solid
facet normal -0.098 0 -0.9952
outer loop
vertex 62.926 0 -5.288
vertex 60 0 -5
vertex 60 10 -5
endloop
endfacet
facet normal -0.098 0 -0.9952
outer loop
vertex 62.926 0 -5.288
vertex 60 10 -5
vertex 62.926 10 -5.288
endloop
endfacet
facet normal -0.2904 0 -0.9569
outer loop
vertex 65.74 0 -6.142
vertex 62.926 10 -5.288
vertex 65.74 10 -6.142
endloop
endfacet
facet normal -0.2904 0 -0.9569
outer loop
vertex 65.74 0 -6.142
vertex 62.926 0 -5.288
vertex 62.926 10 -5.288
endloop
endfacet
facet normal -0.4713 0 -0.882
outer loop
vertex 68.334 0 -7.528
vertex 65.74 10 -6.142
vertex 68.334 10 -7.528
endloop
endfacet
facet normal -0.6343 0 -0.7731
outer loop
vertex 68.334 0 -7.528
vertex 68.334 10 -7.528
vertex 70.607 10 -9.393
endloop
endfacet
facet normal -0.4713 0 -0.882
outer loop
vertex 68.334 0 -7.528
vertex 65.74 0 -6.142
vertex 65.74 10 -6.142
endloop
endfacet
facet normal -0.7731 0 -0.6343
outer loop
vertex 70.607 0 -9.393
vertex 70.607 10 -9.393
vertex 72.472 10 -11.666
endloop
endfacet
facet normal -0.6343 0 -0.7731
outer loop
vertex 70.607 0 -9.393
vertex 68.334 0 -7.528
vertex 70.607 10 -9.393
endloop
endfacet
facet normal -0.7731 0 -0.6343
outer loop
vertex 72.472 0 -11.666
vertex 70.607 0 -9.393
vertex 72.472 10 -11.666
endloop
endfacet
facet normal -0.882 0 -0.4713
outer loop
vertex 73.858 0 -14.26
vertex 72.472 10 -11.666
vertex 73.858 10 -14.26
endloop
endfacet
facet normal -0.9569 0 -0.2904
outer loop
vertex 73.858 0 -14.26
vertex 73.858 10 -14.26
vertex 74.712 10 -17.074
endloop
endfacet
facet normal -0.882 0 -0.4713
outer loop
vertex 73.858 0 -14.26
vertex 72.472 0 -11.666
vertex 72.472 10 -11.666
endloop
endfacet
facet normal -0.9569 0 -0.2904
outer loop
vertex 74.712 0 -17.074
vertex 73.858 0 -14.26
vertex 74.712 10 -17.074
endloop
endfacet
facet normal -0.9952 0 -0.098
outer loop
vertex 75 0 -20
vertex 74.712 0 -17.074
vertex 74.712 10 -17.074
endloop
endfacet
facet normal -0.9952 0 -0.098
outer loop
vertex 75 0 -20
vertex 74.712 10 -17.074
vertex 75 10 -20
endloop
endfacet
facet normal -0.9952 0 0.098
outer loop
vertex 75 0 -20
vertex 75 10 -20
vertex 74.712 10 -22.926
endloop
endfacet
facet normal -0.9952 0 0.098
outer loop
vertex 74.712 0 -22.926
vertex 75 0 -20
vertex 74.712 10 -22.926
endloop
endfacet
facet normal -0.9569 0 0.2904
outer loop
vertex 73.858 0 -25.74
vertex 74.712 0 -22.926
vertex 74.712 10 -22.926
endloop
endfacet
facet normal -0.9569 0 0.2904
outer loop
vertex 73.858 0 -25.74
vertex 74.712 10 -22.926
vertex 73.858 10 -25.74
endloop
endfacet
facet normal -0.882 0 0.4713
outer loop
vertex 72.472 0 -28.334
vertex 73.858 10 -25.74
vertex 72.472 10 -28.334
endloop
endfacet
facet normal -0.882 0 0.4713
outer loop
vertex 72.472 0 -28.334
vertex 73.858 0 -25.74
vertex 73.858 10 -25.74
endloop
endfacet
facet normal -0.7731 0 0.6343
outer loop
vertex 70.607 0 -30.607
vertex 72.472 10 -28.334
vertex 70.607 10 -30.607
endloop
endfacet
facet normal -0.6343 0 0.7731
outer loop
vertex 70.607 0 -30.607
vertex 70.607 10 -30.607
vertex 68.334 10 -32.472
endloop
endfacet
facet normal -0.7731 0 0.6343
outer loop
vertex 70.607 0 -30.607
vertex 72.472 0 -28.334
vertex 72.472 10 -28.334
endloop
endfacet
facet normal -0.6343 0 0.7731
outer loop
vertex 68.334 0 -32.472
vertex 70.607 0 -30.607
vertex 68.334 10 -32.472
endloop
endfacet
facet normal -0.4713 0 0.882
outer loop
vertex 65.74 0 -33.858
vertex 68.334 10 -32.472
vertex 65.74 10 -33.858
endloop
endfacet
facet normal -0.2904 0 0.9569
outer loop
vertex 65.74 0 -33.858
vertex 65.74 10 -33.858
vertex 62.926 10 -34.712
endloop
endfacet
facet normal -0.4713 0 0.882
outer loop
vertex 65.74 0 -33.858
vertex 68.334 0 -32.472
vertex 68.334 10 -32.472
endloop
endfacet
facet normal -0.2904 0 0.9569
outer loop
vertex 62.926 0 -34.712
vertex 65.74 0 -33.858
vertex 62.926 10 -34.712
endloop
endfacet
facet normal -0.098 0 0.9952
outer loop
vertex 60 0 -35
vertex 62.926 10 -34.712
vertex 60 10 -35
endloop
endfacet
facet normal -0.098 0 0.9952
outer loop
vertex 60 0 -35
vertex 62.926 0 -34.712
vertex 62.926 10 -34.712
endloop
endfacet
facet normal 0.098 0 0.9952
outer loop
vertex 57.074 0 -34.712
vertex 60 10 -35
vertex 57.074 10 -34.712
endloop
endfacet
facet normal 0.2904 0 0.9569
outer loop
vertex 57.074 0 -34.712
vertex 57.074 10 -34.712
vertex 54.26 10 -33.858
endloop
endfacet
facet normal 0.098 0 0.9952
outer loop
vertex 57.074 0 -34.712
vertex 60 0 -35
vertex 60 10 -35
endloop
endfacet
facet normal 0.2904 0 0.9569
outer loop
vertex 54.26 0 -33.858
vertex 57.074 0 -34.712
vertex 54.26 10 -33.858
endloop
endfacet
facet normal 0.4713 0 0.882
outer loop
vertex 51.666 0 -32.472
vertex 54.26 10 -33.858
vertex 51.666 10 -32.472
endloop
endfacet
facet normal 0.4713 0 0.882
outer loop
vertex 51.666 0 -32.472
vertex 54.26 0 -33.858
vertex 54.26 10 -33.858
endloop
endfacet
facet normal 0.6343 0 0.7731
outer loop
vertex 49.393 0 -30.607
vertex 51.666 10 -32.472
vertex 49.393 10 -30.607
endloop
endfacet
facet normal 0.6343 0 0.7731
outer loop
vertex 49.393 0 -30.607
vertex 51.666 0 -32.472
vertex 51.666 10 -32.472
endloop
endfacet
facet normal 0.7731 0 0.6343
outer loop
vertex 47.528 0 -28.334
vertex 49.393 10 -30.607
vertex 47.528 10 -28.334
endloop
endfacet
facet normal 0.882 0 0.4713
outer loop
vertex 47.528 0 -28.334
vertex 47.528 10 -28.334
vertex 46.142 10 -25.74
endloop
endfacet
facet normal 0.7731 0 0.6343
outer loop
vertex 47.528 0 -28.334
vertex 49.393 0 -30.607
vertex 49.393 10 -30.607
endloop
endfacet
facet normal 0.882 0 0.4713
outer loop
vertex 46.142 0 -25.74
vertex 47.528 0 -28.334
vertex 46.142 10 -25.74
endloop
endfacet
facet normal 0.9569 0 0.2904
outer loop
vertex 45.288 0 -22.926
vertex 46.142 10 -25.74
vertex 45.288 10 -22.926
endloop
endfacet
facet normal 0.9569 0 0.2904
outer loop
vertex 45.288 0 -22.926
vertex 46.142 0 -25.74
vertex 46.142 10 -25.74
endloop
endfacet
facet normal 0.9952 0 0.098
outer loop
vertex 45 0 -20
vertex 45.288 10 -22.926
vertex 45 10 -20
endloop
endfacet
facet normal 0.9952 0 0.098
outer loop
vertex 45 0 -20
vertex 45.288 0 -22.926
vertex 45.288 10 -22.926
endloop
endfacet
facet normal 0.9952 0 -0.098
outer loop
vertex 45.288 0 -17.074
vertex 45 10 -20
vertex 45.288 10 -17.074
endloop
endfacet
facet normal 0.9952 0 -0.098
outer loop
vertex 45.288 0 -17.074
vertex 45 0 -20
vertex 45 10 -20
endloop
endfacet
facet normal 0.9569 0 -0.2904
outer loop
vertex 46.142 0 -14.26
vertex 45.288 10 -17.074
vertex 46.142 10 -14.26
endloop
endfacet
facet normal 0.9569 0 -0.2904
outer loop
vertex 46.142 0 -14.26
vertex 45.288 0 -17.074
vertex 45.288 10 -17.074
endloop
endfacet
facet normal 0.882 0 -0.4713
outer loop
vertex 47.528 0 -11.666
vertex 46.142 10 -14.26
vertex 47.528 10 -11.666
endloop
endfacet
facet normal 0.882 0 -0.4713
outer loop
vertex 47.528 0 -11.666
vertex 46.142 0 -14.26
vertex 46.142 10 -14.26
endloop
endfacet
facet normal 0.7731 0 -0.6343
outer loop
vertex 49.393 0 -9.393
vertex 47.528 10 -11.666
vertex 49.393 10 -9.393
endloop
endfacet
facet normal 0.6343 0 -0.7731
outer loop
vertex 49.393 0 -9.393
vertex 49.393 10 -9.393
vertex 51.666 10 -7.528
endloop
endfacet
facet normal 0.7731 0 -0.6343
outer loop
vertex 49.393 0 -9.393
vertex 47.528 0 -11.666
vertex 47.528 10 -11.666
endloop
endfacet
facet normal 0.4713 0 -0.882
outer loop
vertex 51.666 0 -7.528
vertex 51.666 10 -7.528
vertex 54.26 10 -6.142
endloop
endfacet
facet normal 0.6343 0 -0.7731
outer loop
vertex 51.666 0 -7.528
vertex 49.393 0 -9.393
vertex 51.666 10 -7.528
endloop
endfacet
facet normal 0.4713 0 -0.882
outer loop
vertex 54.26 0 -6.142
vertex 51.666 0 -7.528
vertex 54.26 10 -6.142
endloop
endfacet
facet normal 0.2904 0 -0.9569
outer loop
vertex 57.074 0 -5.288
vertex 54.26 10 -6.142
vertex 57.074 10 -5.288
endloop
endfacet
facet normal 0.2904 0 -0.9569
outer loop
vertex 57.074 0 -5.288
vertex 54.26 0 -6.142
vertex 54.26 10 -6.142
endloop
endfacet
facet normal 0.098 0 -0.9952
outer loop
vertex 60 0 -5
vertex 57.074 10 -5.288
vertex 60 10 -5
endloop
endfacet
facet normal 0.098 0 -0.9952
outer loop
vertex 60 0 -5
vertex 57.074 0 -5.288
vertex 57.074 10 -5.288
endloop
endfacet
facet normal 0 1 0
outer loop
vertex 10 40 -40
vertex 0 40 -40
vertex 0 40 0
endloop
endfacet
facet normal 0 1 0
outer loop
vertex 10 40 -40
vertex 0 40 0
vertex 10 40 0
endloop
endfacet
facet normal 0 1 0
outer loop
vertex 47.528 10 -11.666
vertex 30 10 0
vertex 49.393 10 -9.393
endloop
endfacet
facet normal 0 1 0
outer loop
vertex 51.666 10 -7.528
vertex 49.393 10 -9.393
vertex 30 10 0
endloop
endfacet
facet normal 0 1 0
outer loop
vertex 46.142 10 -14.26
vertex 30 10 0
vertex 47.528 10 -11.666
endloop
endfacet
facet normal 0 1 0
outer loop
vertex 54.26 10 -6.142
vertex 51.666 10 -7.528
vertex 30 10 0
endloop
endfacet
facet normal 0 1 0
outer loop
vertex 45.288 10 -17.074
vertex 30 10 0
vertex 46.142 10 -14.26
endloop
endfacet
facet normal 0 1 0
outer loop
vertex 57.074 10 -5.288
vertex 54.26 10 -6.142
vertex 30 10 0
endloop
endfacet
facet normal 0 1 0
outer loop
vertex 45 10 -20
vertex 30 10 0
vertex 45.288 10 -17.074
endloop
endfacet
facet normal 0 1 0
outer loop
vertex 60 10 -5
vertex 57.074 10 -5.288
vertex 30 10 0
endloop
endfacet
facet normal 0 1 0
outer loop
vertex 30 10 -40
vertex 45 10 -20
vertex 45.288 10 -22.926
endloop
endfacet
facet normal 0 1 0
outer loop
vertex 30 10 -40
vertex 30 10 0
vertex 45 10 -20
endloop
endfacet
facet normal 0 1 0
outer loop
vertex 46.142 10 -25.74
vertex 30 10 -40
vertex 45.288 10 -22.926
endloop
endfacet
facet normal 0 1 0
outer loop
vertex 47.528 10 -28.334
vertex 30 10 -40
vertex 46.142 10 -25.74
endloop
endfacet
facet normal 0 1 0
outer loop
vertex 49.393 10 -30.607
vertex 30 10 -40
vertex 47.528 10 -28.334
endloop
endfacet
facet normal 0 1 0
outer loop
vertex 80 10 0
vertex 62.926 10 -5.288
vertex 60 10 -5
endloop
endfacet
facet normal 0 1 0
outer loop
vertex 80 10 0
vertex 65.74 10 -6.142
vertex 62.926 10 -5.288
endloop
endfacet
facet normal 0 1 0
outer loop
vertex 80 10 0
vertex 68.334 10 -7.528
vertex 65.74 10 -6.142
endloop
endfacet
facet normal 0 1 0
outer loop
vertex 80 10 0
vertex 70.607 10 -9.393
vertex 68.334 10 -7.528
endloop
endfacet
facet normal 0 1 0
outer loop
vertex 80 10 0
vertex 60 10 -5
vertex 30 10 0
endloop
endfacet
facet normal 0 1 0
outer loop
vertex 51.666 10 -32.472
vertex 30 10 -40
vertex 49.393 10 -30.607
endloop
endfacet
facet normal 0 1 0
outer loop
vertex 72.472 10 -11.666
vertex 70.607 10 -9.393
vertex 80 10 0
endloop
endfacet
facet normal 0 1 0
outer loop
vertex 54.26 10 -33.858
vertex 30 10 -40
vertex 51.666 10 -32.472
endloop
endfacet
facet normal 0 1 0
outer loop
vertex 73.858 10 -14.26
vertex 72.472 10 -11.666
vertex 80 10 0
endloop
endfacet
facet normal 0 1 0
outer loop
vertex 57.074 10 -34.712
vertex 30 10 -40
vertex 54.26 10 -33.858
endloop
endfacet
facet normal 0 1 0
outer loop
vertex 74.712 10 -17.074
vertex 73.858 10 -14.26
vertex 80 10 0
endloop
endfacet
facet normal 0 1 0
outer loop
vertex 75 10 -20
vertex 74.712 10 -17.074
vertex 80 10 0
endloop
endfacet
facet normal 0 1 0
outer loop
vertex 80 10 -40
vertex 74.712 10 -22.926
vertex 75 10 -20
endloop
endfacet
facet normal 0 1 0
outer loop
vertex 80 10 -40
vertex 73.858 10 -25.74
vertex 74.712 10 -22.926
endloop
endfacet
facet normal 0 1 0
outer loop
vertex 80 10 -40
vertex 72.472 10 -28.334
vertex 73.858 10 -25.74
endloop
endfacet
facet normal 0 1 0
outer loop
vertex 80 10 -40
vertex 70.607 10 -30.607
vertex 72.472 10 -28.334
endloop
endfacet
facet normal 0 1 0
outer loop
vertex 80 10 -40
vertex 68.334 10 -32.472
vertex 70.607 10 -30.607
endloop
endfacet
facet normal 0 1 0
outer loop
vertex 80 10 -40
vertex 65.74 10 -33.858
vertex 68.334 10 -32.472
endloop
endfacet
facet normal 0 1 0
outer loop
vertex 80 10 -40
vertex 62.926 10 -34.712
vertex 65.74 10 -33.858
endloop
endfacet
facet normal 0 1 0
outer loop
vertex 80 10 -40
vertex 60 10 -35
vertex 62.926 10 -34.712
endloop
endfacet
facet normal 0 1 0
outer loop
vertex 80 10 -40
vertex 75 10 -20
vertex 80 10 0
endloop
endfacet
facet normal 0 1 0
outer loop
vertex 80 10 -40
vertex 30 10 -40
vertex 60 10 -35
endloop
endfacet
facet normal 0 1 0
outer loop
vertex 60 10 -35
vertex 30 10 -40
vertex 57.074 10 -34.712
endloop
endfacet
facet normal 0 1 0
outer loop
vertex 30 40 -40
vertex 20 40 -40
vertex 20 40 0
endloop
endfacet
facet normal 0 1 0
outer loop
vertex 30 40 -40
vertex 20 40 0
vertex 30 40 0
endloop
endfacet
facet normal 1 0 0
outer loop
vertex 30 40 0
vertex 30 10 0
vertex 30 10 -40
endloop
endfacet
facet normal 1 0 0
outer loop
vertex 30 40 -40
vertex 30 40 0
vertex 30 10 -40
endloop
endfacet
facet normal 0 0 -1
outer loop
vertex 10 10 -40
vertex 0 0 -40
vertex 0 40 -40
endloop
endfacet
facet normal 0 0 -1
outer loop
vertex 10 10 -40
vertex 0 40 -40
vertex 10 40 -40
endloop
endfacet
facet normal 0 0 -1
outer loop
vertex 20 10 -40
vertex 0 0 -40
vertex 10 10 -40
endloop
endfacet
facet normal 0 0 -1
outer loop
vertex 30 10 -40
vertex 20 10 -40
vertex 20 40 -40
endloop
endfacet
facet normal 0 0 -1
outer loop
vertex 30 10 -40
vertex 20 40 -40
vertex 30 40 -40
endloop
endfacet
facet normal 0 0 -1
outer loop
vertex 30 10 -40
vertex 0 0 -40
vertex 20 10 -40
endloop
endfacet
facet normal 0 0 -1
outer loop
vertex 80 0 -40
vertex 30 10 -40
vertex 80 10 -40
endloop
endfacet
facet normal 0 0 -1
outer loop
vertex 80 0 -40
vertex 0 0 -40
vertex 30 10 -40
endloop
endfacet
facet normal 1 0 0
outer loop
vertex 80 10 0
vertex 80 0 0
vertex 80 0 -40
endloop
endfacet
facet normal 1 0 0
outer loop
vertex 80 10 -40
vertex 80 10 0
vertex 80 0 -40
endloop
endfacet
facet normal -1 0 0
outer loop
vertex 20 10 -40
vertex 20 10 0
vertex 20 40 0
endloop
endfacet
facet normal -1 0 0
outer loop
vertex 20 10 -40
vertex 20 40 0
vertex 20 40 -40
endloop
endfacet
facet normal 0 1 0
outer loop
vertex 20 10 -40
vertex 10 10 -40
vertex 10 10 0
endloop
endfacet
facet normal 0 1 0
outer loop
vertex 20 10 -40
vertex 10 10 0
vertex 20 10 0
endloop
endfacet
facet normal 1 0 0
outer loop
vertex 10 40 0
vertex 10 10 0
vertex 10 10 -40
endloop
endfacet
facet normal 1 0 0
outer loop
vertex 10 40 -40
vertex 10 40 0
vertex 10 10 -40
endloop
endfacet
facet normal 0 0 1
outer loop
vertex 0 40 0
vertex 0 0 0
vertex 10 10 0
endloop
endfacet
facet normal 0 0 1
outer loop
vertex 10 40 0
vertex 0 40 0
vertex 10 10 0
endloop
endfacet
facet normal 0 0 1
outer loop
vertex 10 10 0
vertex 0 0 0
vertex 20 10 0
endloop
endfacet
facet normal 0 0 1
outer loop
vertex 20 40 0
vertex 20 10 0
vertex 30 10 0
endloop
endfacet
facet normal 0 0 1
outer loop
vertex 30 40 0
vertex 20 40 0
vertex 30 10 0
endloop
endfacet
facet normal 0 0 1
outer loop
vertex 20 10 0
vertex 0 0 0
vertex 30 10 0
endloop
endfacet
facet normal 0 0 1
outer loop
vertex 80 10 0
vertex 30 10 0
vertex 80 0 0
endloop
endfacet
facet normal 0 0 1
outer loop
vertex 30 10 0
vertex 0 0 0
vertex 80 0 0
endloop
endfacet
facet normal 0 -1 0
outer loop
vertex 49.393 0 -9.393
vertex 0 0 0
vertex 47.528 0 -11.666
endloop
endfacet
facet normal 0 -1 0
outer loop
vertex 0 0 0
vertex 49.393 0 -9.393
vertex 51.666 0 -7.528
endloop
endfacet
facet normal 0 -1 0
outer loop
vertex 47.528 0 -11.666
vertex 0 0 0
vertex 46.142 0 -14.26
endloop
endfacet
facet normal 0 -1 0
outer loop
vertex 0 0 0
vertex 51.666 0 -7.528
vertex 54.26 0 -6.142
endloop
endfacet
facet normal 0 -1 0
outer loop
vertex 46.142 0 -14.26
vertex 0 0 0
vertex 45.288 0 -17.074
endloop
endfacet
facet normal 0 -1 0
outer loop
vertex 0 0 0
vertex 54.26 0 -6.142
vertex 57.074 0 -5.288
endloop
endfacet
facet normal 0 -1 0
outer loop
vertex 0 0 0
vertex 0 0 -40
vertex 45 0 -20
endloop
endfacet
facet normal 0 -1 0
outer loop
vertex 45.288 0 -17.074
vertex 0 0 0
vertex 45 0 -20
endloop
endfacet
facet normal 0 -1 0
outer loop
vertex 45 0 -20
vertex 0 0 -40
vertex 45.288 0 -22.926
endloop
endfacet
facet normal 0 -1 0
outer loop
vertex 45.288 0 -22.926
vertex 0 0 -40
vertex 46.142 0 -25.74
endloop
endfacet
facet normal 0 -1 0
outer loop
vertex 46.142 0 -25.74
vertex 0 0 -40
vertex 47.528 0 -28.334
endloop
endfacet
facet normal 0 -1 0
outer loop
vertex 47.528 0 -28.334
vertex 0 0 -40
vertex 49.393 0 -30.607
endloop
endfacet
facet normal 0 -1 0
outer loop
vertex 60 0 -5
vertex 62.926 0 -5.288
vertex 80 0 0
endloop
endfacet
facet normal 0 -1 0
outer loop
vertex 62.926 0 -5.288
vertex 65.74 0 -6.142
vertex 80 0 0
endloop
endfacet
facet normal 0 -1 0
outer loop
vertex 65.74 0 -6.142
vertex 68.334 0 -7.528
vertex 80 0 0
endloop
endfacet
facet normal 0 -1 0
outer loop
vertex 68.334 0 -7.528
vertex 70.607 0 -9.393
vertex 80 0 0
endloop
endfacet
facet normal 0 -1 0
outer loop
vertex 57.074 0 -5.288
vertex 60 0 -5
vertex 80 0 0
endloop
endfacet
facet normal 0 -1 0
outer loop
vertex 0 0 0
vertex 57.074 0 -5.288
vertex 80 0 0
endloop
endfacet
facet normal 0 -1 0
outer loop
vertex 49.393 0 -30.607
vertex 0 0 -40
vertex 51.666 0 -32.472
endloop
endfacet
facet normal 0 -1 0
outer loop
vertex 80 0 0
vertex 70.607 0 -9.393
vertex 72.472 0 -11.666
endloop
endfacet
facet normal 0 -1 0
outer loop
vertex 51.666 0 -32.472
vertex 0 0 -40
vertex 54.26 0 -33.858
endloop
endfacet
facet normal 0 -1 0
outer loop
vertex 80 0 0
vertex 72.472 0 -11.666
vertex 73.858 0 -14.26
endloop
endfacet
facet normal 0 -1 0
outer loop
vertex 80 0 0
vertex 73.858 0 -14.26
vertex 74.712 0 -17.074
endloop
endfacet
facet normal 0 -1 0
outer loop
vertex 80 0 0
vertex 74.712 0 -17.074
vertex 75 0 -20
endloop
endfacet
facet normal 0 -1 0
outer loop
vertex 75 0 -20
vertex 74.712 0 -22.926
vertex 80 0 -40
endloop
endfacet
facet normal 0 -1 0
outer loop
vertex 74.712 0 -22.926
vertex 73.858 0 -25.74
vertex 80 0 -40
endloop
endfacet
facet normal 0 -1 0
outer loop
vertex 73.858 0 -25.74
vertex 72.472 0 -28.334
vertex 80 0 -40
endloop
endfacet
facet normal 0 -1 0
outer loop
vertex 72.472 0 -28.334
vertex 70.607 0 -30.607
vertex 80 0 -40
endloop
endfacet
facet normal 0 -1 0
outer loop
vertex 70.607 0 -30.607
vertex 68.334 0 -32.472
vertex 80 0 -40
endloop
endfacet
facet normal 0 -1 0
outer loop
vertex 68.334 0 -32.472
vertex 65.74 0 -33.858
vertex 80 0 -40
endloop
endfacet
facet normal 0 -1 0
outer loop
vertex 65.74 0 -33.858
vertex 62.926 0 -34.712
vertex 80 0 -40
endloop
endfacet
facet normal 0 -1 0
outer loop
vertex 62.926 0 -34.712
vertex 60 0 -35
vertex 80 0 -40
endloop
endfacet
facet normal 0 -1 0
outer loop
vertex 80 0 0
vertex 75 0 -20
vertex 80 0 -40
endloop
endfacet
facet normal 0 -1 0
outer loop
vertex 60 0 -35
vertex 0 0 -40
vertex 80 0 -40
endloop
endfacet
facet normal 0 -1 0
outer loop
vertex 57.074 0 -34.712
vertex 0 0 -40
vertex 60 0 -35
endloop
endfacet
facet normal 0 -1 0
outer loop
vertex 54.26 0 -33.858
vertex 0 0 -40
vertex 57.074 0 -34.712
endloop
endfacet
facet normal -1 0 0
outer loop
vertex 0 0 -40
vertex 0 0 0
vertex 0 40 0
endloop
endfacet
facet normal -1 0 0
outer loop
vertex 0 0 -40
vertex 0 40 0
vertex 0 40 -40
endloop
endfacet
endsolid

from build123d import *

# Parameters (mm, degrees)
SKETCH1_W             = 10
SKETCH1_H             = 40
BOSS_EXTRUDE1_DEPTH   = 40
BOSS_EXTRUDE1_2_DEPTH = 40
SKETCH1_3_W           = 10
SKETCH1_3_H           = 40
SKETCH1_3_W_2         = 50
SKETCH1_3_R           = 15
BOSS_EXTRUDE2_DEPTH   = 10


with BuildPart() as part:
    # Sketch1 → Boss-Extrude1 (new body)
    with BuildSketch(Plane(origin=(0, 0, 0), x_dir=(1, 0, 0), z_dir=(0, 1, 0))):
        with Locations((5, 20)):
            Rectangle(SKETCH1_W, SKETCH1_H)
    extrude(amount=BOSS_EXTRUDE1_DEPTH)



with BuildPart() as body_2:
    # Sketch1 → Boss-Extrude1 2 (new body)
    with BuildSketch(Plane(origin=(0, 0, 0), x_dir=(1, 0, 0), z_dir=(0, 1, 0))):
        with Locations((25, 20)):
            Rectangle(SKETCH1_W, SKETCH1_H)
    extrude(amount=BOSS_EXTRUDE1_2_DEPTH)


with BuildPart() as part_1:
    add(part.part)

    add(body_2.part)  # Boss-Extrude2 merges body 2
    # Sketch1<3> → Boss-Extrude2 (add)
    # profile 1 of 2: a face of its own
    with BuildSketch(Plane(origin=(0, 0, 0), x_dir=(1, 0, 0), z_dir=(0, 1, 0))):
        with Locations((15, 20)):
            Rectangle(SKETCH1_3_W, SKETCH1_3_H)
    # profile 2 of 2: a face of its own
    with BuildSketch(Plane(origin=(0, 0, 0), x_dir=(1, 0, 0), z_dir=(0, 1, 0))):
        with Locations((55, 20)):
            Rectangle(SKETCH1_3_W_2, SKETCH1_3_H)
        with Locations((60, 20)):
            Circle(SKETCH1_3_R, mode=Mode.SUBTRACT)
    extrude(amount=BOSS_EXTRUDE2_DEPTH)


solid = part_1.part
